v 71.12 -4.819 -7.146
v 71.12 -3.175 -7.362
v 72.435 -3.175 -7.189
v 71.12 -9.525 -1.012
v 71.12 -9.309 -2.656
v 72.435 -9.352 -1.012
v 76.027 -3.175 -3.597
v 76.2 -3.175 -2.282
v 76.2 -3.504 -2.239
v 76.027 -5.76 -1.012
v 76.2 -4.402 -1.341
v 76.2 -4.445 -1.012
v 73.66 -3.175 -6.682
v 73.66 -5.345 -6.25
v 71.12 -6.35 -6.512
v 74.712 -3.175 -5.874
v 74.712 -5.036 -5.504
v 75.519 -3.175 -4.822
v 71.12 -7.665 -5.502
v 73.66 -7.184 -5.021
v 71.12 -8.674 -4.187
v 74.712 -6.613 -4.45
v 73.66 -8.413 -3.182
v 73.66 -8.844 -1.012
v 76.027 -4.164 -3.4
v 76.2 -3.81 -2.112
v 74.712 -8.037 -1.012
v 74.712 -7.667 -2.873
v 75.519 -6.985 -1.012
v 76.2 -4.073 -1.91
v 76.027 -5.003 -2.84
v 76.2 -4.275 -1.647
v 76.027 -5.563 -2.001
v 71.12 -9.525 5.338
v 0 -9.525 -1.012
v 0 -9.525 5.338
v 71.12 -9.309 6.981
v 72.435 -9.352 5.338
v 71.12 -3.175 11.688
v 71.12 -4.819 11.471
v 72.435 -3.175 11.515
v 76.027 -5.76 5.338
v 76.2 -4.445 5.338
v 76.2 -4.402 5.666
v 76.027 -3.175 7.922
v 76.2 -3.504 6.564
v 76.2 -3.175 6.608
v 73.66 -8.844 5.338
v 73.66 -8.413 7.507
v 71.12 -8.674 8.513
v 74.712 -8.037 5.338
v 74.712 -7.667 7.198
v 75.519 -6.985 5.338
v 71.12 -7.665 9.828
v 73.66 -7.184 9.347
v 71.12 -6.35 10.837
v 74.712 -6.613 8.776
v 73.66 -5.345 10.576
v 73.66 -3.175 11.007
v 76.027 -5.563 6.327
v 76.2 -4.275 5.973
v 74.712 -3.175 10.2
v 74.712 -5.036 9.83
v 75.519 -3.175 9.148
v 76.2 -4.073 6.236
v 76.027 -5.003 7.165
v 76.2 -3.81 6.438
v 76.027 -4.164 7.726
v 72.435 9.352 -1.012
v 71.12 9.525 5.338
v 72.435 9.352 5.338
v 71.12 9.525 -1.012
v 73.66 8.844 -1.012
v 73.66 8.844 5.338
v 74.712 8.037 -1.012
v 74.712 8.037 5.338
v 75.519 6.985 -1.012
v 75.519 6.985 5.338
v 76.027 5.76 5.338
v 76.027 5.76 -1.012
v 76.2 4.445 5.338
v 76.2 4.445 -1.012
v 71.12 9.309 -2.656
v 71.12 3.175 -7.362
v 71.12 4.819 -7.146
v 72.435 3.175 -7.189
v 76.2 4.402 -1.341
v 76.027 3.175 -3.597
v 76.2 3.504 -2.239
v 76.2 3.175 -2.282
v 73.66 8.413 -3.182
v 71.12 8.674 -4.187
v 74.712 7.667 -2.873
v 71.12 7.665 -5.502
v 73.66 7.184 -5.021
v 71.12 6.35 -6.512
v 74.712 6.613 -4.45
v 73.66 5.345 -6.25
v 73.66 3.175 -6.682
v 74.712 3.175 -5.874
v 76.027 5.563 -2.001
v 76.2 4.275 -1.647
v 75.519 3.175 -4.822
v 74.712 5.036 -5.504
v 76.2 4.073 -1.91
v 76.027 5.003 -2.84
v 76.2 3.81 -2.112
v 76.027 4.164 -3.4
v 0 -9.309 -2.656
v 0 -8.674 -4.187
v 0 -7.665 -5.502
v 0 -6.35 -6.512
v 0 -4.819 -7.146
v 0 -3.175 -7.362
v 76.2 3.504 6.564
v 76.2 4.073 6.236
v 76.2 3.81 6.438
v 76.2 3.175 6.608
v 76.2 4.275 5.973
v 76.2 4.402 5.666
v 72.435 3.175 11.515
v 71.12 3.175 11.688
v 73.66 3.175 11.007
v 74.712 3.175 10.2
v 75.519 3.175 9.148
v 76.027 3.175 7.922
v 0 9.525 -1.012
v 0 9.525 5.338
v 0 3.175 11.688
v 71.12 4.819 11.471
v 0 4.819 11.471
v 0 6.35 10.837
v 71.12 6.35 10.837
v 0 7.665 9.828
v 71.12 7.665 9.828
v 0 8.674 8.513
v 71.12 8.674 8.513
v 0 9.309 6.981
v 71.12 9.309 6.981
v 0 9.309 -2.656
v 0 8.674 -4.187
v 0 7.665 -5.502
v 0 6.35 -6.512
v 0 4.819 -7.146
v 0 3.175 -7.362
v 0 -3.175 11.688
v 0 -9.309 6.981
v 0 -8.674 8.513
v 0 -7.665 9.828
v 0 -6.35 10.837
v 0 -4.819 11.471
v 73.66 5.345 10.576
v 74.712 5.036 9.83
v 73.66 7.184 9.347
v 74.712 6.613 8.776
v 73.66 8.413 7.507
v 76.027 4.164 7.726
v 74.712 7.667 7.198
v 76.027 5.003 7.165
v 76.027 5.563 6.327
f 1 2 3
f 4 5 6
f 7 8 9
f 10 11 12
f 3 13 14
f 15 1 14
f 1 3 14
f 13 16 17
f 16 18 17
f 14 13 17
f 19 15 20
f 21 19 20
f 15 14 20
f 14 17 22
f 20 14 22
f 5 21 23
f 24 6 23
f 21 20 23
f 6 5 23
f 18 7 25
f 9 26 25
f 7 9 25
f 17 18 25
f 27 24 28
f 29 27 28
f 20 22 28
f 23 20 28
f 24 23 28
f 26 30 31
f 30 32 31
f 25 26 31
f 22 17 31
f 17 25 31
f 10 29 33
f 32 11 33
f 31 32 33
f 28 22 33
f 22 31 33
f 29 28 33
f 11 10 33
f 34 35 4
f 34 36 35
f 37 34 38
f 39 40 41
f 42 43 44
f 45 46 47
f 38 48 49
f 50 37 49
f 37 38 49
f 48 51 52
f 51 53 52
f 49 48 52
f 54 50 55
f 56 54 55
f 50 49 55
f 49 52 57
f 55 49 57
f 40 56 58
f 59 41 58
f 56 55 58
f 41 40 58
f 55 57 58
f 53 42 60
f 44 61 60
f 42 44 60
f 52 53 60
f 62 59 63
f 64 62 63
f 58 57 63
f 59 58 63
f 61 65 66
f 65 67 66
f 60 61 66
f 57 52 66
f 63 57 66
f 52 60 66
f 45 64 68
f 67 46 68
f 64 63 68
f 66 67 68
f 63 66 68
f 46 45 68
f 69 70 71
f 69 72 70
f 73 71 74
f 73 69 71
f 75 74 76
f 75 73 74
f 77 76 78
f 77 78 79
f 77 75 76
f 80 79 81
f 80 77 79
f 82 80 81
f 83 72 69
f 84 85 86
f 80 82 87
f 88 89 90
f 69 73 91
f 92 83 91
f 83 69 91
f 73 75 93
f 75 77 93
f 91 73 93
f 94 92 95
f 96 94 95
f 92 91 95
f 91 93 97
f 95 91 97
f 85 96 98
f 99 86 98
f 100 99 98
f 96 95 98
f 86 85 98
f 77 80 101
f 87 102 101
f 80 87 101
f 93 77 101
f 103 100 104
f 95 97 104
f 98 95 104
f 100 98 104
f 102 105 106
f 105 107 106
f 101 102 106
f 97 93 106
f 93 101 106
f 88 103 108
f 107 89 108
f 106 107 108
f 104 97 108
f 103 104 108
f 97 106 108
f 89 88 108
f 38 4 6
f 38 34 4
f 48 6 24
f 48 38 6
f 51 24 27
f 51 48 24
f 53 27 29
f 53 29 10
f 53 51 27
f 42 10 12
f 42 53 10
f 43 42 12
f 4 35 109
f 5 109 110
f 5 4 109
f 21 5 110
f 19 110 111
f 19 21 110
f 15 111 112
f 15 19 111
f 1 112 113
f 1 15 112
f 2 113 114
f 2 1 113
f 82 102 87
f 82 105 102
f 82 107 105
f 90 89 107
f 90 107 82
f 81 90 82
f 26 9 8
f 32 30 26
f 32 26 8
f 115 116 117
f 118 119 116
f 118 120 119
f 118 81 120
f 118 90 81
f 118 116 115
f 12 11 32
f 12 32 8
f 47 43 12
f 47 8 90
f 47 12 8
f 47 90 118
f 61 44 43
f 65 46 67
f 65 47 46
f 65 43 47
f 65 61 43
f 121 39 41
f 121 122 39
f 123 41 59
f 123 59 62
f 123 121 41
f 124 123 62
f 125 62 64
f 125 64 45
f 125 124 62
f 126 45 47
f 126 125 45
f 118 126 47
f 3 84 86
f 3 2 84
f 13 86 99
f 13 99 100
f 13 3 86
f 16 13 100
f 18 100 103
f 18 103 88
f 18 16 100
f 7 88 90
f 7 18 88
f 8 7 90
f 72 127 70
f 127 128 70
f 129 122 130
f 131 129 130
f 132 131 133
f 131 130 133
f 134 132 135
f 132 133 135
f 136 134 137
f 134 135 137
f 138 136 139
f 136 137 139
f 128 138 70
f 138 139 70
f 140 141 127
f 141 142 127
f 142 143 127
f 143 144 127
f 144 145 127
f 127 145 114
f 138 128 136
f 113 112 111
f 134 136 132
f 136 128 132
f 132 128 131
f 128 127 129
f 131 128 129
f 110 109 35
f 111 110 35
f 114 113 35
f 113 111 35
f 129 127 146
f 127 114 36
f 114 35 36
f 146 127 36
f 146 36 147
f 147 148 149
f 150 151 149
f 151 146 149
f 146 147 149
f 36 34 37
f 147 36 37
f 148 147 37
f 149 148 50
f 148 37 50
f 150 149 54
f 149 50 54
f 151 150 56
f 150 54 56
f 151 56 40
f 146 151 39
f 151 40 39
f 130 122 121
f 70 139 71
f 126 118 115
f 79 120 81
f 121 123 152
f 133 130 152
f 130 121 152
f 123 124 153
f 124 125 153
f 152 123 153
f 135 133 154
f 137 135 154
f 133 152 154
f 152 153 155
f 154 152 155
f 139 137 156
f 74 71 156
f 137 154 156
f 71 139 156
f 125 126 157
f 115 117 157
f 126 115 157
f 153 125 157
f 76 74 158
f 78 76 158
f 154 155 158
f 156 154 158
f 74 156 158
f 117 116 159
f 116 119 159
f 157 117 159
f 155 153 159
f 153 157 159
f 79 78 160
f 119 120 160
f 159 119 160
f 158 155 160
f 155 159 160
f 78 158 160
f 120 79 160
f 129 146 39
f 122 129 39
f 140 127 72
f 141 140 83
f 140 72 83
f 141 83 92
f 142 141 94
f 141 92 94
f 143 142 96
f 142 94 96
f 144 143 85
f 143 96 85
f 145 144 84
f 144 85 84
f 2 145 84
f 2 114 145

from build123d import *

# Parameters (mm, degrees)
F0_W     = 76.2
F0_H     = 19.05
F1_DEPTH = 9.525
F2_R     = 6.35
F3_R     = 5.08


with BuildPart() as f1:
    # F0 (on Front) → F1 (new body, symmetric)
    with BuildSketch(Plane.XZ):
        with Locations((38.1, 2.162681)):
            Rectangle(F0_W, F0_H)
    extrude(amount=F1_DEPTH, both=True)

    # F2
    f2_edges = [f1.edges().sort_by_distance(p)[0] for p in [
        (38.1, 9.525, 11.687681),
        (38.1, -9.525, 11.687681),
        (38.1, -9.525, -7.362319),
        (38.1, 9.525, -7.362319),
    ]]
    fillet(f2_edges, radius=F2_R)

    # F3
    f3_edges = [f1.edges().sort_by_distance(p)[0] for p in [
        (76.2, 0, 11.687681),
    ]]
    fillet(f3_edges, radius=F3_R)


solid = f1.part
